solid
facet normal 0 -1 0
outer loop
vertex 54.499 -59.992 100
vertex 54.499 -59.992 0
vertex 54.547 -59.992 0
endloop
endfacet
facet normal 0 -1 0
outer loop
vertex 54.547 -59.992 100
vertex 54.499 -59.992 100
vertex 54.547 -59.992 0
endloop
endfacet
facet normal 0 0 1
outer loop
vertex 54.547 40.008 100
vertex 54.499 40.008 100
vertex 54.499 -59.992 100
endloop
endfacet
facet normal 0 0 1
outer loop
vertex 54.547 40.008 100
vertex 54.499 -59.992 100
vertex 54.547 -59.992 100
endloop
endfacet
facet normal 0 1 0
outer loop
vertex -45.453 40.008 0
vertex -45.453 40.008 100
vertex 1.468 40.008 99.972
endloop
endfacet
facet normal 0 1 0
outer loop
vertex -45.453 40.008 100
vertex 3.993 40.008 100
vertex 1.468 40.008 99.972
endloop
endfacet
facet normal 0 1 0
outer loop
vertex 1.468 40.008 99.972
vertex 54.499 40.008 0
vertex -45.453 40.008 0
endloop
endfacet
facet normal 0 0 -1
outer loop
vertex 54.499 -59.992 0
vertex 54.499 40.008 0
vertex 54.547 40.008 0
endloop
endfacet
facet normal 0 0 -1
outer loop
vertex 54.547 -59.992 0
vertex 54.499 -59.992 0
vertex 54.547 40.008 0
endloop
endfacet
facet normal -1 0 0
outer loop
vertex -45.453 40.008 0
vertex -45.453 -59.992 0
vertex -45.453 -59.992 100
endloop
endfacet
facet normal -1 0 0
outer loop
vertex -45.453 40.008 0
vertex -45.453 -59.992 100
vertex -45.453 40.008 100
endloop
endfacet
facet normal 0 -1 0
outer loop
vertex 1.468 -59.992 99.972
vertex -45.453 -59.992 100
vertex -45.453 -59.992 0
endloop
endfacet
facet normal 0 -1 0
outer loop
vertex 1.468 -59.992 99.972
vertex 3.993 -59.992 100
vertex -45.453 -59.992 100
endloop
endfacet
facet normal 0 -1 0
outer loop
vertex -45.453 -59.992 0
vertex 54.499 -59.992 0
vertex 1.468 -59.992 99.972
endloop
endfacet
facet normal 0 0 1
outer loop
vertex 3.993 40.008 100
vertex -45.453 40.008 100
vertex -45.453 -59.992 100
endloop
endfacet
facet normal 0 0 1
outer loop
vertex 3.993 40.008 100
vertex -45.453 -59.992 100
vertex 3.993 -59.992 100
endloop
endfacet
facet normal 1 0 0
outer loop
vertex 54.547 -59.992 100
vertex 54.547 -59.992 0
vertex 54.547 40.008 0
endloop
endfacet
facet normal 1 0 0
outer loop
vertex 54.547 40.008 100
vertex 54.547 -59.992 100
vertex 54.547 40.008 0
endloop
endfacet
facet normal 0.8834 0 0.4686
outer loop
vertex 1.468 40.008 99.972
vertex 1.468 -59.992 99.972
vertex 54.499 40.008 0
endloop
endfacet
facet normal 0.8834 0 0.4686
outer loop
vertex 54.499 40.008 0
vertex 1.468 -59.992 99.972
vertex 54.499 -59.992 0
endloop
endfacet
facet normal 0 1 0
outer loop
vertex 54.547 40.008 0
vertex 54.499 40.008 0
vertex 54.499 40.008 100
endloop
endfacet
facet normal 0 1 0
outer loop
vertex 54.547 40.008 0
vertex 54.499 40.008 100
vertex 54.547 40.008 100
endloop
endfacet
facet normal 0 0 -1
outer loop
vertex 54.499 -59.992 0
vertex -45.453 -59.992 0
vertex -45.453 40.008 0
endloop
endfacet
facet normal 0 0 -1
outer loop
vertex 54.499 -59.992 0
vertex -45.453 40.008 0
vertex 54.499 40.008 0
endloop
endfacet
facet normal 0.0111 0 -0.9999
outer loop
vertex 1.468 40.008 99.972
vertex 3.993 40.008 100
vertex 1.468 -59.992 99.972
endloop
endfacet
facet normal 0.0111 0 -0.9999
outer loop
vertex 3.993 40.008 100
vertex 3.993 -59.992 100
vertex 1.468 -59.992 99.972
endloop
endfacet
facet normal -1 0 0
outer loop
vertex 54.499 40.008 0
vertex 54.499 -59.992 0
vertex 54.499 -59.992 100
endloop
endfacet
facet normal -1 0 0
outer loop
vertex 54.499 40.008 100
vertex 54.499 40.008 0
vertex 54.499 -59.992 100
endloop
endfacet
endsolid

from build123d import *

# Parameters (mm, degrees)
F0_W     = 100
F0_H     = 100
F1_DEPTH = 100
F3_DEPTH = 85


with BuildPart() as f1:
    # F0 (on Top) → F1 (new body)
    with BuildSketch(Plane.XY):
        with Locations((4.546897, -9.991997)):
            Rectangle(F0_W, F0_H)
    extrude(amount=F1_DEPTH)

    # F2 (on Front) → F3 (cut, symmetric)
    with BuildSketch(Plane.XZ):
        Polygon((54.498803, 0), (54.498803, 100.559108), (1.467651, 99.972047), align=None)
    extrude(amount=F3_DEPTH, both=True, mode=Mode.SUBTRACT)


solid = f1.part
